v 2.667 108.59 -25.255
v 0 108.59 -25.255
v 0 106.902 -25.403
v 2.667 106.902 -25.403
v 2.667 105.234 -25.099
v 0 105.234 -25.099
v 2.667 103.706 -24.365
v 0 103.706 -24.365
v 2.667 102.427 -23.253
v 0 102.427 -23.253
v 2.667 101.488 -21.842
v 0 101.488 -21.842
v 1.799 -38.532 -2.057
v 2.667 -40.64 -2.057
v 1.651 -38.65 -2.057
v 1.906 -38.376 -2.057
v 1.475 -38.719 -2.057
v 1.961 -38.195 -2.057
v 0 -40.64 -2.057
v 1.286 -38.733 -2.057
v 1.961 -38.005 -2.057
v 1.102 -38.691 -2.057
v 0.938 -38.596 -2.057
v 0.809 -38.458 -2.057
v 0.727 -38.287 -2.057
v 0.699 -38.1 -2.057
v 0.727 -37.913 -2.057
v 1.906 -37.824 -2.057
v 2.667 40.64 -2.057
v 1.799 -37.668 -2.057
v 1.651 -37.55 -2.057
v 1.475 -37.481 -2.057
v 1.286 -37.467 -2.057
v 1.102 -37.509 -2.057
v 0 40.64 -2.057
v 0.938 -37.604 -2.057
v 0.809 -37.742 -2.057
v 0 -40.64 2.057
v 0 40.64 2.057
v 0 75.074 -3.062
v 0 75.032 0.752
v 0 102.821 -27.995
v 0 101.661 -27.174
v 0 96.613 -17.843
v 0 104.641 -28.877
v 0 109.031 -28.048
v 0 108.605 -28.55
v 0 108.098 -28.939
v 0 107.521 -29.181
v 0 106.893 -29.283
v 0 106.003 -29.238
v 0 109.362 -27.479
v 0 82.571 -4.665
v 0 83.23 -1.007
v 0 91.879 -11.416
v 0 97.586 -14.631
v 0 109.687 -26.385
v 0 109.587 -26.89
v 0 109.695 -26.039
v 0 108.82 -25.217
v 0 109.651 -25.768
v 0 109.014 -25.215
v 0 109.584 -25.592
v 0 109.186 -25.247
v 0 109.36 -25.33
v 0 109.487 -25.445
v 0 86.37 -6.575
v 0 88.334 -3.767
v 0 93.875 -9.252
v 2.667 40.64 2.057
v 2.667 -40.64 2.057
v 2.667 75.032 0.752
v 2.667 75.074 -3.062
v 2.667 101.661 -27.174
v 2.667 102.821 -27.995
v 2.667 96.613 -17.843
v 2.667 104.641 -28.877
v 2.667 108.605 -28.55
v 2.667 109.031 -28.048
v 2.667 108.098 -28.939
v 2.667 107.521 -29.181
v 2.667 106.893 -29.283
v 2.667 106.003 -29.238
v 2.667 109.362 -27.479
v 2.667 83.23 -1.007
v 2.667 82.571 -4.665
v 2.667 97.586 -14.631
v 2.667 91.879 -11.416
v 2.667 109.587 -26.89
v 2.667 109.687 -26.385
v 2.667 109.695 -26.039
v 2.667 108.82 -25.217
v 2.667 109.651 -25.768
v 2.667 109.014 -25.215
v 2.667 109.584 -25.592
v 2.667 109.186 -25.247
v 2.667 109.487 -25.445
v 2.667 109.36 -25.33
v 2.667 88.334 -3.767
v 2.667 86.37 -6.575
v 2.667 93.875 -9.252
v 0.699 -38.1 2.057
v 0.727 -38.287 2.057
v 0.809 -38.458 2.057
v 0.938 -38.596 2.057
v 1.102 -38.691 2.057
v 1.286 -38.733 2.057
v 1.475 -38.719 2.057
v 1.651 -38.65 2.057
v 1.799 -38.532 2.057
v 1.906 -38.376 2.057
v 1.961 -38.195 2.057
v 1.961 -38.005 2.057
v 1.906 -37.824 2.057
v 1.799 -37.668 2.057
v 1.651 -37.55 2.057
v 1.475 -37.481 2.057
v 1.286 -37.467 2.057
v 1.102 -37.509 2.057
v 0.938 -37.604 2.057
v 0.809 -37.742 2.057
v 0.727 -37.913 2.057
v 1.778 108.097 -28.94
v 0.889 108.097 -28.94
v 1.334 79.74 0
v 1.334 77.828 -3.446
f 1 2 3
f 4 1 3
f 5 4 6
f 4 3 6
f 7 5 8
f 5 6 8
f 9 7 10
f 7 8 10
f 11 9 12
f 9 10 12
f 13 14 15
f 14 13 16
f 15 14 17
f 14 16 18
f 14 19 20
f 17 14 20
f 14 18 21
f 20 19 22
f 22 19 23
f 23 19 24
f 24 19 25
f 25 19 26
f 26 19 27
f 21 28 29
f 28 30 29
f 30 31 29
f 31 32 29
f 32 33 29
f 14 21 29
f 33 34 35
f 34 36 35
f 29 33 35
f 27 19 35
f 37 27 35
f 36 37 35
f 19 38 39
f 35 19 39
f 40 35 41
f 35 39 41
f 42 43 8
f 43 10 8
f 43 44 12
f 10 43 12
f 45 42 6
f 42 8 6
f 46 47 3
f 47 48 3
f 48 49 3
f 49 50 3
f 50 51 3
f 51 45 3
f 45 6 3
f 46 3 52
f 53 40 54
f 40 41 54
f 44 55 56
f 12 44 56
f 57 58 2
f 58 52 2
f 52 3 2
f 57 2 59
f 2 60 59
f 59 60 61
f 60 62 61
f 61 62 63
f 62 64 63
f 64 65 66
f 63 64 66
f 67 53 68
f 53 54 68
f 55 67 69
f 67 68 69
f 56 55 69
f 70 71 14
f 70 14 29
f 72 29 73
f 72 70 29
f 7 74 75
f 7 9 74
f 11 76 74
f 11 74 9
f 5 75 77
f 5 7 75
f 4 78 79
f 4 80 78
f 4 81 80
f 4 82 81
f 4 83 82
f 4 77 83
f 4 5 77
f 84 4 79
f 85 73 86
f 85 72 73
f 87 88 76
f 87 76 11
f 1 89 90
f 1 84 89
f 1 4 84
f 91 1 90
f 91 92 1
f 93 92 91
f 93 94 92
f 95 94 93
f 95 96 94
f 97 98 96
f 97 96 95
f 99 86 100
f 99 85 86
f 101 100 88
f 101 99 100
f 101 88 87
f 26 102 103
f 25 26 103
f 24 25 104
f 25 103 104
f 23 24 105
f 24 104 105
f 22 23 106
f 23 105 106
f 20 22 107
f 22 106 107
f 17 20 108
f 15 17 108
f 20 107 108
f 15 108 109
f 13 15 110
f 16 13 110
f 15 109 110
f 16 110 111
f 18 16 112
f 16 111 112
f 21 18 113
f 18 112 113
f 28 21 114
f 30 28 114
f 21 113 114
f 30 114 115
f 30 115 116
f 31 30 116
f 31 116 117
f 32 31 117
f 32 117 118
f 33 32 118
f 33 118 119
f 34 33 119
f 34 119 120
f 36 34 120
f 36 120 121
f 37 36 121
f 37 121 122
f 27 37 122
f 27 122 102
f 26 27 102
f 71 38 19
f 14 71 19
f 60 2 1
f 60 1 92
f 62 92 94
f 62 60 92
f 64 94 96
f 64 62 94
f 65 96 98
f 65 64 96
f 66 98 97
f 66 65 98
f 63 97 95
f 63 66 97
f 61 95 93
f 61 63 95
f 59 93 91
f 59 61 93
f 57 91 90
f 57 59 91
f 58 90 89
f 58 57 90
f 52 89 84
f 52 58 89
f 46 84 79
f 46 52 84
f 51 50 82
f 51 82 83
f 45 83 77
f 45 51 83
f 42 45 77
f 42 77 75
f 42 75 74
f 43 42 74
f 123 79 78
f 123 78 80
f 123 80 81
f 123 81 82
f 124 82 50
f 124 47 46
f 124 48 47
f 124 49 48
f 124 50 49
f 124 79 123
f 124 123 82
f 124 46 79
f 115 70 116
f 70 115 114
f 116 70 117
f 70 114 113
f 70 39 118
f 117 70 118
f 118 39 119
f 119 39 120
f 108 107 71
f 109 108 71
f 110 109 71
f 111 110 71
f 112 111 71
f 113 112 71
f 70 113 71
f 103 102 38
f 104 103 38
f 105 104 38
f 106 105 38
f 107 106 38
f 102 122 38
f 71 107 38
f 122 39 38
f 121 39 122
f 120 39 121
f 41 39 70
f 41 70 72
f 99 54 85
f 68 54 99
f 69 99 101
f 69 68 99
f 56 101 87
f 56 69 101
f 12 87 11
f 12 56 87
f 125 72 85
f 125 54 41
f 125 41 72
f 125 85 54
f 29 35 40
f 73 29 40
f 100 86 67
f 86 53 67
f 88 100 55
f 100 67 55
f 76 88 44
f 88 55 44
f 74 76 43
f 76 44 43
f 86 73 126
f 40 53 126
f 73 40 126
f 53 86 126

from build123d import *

# Parameters (mm, degrees)
F1_DEPTH = 2.667
F3_DEPTH = 7.62


# Not quite as in the source:
# - a feature names something its author has since deleted; it is built from what else it names


with BuildPart() as f1:
    # F0 (on Right) → F1 (new body)
    with BuildSketch(Plane.YZ):
        with BuildLine():
            Line((40.64, 2.0574), (-40.64, 2.0574))
            Line((-40.64, 2.0574), (-40.64, -2.0574))
            Line((-40.64, -2.0574), (40.64, -2.0574))
            add(Edge.make_bspline(
                [(40.64, -2.0574), (65.2363823215, -2.8826714553), (76.2322454092, -1.6712410932), (92.2423381, -7.3297932663), (101.6609776162, -27.1740333276)],
                knots=[0, 0, 0, 0, 0.5126548587, 1, 1, 1, 1], degree=3))
            add(Edge.make_bspline(
                [(108.5904209732, -25.2548671865), (108.7105657483, -25.2278232734), (110.4026487154, -24.9989116735), (108.7163421886, -31.7866160491), (102.515230767, -27.9502297874), (101.6609776162, -27.1740333276)],
                knots=[0.3182831671, 0.3182831671, 0.3182831671, 0.3182831671, 0.3383676917, 0.6233018603, 1, 1, 1, 1], degree=3))
            add(Edge.make_bspline(
                [(103.7919735763, -26.8453606559), (102.5910145162, -29.1182734519), (106.6864645495, -25.6834370678), (108.5904209732, -25.2548671865)],
                knots=[0, 0, 0, 0, 0.3182831671, 0.3182831671, 0.3182831671, 0.3182831671], degree=3))
            add(Edge.make_bspline(
                [(101.4876463788, -21.8415304228), (102.2436901965, -23.3930273167), (103.0115093513, -25.0580021652), (103.7919735763, -26.8453606559)],
                knots=[0.9590345904, 0.9590345904, 0.9590345904, 0.9590345904, 1, 1, 1, 1], degree=3))
            add(Edge.make_bspline(
                [(40.64, 2.0574), (65.0790578645, 0.8669100168), (78.5265501087, 2.3760846123), (93.2067806774, -4.8481536974), (101.4876463788, -21.8415304228)],
                knots=[0, 0, 0, 0, 0.5103449149, 0.9590345904, 0.9590345904, 0.9590345904, 0.9590345904], degree=3))
        make_face()
        with BuildLine():
            ThreePointArc((108.5904209732, -25.2548671865), (104.4454971864, -24.7832822995), (101.4876463788, -21.8415304228))
            add(Edge.make_bspline(
                [(101.4876463788, -21.8415304228), (102.2436901965, -23.3930273167), (103.0115093513, -25.0580021652), (103.7919735763, -26.8453606559)],
                knots=[0.9590345904, 0.9590345904, 0.9590345904, 0.9590345904, 1, 1, 1, 1], degree=3))
            add(Edge.make_bspline(
                [(103.7919735763, -26.8453606559), (102.5910145162, -29.1182734519), (106.6864645495, -25.6834370678), (108.5904209732, -25.2548671865)],
                knots=[0, 0, 0, 0, 0.3182831671, 0.3182831671, 0.3182831671, 0.3182831671], degree=3))
        make_face()
    extrude(amount=F1_DEPTH)

    # F2 (on face) → F3 (cut)
    with BuildSketch(Plane.XY.offset(2.0574)):
        with BuildLine():
            Line((0.6985, -38.1), (1.9685, -38.1))
            ThreePointArc((1.9685, -38.1), (1.3335, -37.465), (0.6985, -38.1))
        make_face()
        with BuildLine():
            ThreePointArc((0.6985, -38.1), (1.3335, -38.735), (1.9685, -38.1))
            Line((1.9685, -38.1), (0.6985, -38.1))
        make_face()
    extrude(amount=-F3_DEPTH, mode=Mode.SUBTRACT)


solid = f1.part
